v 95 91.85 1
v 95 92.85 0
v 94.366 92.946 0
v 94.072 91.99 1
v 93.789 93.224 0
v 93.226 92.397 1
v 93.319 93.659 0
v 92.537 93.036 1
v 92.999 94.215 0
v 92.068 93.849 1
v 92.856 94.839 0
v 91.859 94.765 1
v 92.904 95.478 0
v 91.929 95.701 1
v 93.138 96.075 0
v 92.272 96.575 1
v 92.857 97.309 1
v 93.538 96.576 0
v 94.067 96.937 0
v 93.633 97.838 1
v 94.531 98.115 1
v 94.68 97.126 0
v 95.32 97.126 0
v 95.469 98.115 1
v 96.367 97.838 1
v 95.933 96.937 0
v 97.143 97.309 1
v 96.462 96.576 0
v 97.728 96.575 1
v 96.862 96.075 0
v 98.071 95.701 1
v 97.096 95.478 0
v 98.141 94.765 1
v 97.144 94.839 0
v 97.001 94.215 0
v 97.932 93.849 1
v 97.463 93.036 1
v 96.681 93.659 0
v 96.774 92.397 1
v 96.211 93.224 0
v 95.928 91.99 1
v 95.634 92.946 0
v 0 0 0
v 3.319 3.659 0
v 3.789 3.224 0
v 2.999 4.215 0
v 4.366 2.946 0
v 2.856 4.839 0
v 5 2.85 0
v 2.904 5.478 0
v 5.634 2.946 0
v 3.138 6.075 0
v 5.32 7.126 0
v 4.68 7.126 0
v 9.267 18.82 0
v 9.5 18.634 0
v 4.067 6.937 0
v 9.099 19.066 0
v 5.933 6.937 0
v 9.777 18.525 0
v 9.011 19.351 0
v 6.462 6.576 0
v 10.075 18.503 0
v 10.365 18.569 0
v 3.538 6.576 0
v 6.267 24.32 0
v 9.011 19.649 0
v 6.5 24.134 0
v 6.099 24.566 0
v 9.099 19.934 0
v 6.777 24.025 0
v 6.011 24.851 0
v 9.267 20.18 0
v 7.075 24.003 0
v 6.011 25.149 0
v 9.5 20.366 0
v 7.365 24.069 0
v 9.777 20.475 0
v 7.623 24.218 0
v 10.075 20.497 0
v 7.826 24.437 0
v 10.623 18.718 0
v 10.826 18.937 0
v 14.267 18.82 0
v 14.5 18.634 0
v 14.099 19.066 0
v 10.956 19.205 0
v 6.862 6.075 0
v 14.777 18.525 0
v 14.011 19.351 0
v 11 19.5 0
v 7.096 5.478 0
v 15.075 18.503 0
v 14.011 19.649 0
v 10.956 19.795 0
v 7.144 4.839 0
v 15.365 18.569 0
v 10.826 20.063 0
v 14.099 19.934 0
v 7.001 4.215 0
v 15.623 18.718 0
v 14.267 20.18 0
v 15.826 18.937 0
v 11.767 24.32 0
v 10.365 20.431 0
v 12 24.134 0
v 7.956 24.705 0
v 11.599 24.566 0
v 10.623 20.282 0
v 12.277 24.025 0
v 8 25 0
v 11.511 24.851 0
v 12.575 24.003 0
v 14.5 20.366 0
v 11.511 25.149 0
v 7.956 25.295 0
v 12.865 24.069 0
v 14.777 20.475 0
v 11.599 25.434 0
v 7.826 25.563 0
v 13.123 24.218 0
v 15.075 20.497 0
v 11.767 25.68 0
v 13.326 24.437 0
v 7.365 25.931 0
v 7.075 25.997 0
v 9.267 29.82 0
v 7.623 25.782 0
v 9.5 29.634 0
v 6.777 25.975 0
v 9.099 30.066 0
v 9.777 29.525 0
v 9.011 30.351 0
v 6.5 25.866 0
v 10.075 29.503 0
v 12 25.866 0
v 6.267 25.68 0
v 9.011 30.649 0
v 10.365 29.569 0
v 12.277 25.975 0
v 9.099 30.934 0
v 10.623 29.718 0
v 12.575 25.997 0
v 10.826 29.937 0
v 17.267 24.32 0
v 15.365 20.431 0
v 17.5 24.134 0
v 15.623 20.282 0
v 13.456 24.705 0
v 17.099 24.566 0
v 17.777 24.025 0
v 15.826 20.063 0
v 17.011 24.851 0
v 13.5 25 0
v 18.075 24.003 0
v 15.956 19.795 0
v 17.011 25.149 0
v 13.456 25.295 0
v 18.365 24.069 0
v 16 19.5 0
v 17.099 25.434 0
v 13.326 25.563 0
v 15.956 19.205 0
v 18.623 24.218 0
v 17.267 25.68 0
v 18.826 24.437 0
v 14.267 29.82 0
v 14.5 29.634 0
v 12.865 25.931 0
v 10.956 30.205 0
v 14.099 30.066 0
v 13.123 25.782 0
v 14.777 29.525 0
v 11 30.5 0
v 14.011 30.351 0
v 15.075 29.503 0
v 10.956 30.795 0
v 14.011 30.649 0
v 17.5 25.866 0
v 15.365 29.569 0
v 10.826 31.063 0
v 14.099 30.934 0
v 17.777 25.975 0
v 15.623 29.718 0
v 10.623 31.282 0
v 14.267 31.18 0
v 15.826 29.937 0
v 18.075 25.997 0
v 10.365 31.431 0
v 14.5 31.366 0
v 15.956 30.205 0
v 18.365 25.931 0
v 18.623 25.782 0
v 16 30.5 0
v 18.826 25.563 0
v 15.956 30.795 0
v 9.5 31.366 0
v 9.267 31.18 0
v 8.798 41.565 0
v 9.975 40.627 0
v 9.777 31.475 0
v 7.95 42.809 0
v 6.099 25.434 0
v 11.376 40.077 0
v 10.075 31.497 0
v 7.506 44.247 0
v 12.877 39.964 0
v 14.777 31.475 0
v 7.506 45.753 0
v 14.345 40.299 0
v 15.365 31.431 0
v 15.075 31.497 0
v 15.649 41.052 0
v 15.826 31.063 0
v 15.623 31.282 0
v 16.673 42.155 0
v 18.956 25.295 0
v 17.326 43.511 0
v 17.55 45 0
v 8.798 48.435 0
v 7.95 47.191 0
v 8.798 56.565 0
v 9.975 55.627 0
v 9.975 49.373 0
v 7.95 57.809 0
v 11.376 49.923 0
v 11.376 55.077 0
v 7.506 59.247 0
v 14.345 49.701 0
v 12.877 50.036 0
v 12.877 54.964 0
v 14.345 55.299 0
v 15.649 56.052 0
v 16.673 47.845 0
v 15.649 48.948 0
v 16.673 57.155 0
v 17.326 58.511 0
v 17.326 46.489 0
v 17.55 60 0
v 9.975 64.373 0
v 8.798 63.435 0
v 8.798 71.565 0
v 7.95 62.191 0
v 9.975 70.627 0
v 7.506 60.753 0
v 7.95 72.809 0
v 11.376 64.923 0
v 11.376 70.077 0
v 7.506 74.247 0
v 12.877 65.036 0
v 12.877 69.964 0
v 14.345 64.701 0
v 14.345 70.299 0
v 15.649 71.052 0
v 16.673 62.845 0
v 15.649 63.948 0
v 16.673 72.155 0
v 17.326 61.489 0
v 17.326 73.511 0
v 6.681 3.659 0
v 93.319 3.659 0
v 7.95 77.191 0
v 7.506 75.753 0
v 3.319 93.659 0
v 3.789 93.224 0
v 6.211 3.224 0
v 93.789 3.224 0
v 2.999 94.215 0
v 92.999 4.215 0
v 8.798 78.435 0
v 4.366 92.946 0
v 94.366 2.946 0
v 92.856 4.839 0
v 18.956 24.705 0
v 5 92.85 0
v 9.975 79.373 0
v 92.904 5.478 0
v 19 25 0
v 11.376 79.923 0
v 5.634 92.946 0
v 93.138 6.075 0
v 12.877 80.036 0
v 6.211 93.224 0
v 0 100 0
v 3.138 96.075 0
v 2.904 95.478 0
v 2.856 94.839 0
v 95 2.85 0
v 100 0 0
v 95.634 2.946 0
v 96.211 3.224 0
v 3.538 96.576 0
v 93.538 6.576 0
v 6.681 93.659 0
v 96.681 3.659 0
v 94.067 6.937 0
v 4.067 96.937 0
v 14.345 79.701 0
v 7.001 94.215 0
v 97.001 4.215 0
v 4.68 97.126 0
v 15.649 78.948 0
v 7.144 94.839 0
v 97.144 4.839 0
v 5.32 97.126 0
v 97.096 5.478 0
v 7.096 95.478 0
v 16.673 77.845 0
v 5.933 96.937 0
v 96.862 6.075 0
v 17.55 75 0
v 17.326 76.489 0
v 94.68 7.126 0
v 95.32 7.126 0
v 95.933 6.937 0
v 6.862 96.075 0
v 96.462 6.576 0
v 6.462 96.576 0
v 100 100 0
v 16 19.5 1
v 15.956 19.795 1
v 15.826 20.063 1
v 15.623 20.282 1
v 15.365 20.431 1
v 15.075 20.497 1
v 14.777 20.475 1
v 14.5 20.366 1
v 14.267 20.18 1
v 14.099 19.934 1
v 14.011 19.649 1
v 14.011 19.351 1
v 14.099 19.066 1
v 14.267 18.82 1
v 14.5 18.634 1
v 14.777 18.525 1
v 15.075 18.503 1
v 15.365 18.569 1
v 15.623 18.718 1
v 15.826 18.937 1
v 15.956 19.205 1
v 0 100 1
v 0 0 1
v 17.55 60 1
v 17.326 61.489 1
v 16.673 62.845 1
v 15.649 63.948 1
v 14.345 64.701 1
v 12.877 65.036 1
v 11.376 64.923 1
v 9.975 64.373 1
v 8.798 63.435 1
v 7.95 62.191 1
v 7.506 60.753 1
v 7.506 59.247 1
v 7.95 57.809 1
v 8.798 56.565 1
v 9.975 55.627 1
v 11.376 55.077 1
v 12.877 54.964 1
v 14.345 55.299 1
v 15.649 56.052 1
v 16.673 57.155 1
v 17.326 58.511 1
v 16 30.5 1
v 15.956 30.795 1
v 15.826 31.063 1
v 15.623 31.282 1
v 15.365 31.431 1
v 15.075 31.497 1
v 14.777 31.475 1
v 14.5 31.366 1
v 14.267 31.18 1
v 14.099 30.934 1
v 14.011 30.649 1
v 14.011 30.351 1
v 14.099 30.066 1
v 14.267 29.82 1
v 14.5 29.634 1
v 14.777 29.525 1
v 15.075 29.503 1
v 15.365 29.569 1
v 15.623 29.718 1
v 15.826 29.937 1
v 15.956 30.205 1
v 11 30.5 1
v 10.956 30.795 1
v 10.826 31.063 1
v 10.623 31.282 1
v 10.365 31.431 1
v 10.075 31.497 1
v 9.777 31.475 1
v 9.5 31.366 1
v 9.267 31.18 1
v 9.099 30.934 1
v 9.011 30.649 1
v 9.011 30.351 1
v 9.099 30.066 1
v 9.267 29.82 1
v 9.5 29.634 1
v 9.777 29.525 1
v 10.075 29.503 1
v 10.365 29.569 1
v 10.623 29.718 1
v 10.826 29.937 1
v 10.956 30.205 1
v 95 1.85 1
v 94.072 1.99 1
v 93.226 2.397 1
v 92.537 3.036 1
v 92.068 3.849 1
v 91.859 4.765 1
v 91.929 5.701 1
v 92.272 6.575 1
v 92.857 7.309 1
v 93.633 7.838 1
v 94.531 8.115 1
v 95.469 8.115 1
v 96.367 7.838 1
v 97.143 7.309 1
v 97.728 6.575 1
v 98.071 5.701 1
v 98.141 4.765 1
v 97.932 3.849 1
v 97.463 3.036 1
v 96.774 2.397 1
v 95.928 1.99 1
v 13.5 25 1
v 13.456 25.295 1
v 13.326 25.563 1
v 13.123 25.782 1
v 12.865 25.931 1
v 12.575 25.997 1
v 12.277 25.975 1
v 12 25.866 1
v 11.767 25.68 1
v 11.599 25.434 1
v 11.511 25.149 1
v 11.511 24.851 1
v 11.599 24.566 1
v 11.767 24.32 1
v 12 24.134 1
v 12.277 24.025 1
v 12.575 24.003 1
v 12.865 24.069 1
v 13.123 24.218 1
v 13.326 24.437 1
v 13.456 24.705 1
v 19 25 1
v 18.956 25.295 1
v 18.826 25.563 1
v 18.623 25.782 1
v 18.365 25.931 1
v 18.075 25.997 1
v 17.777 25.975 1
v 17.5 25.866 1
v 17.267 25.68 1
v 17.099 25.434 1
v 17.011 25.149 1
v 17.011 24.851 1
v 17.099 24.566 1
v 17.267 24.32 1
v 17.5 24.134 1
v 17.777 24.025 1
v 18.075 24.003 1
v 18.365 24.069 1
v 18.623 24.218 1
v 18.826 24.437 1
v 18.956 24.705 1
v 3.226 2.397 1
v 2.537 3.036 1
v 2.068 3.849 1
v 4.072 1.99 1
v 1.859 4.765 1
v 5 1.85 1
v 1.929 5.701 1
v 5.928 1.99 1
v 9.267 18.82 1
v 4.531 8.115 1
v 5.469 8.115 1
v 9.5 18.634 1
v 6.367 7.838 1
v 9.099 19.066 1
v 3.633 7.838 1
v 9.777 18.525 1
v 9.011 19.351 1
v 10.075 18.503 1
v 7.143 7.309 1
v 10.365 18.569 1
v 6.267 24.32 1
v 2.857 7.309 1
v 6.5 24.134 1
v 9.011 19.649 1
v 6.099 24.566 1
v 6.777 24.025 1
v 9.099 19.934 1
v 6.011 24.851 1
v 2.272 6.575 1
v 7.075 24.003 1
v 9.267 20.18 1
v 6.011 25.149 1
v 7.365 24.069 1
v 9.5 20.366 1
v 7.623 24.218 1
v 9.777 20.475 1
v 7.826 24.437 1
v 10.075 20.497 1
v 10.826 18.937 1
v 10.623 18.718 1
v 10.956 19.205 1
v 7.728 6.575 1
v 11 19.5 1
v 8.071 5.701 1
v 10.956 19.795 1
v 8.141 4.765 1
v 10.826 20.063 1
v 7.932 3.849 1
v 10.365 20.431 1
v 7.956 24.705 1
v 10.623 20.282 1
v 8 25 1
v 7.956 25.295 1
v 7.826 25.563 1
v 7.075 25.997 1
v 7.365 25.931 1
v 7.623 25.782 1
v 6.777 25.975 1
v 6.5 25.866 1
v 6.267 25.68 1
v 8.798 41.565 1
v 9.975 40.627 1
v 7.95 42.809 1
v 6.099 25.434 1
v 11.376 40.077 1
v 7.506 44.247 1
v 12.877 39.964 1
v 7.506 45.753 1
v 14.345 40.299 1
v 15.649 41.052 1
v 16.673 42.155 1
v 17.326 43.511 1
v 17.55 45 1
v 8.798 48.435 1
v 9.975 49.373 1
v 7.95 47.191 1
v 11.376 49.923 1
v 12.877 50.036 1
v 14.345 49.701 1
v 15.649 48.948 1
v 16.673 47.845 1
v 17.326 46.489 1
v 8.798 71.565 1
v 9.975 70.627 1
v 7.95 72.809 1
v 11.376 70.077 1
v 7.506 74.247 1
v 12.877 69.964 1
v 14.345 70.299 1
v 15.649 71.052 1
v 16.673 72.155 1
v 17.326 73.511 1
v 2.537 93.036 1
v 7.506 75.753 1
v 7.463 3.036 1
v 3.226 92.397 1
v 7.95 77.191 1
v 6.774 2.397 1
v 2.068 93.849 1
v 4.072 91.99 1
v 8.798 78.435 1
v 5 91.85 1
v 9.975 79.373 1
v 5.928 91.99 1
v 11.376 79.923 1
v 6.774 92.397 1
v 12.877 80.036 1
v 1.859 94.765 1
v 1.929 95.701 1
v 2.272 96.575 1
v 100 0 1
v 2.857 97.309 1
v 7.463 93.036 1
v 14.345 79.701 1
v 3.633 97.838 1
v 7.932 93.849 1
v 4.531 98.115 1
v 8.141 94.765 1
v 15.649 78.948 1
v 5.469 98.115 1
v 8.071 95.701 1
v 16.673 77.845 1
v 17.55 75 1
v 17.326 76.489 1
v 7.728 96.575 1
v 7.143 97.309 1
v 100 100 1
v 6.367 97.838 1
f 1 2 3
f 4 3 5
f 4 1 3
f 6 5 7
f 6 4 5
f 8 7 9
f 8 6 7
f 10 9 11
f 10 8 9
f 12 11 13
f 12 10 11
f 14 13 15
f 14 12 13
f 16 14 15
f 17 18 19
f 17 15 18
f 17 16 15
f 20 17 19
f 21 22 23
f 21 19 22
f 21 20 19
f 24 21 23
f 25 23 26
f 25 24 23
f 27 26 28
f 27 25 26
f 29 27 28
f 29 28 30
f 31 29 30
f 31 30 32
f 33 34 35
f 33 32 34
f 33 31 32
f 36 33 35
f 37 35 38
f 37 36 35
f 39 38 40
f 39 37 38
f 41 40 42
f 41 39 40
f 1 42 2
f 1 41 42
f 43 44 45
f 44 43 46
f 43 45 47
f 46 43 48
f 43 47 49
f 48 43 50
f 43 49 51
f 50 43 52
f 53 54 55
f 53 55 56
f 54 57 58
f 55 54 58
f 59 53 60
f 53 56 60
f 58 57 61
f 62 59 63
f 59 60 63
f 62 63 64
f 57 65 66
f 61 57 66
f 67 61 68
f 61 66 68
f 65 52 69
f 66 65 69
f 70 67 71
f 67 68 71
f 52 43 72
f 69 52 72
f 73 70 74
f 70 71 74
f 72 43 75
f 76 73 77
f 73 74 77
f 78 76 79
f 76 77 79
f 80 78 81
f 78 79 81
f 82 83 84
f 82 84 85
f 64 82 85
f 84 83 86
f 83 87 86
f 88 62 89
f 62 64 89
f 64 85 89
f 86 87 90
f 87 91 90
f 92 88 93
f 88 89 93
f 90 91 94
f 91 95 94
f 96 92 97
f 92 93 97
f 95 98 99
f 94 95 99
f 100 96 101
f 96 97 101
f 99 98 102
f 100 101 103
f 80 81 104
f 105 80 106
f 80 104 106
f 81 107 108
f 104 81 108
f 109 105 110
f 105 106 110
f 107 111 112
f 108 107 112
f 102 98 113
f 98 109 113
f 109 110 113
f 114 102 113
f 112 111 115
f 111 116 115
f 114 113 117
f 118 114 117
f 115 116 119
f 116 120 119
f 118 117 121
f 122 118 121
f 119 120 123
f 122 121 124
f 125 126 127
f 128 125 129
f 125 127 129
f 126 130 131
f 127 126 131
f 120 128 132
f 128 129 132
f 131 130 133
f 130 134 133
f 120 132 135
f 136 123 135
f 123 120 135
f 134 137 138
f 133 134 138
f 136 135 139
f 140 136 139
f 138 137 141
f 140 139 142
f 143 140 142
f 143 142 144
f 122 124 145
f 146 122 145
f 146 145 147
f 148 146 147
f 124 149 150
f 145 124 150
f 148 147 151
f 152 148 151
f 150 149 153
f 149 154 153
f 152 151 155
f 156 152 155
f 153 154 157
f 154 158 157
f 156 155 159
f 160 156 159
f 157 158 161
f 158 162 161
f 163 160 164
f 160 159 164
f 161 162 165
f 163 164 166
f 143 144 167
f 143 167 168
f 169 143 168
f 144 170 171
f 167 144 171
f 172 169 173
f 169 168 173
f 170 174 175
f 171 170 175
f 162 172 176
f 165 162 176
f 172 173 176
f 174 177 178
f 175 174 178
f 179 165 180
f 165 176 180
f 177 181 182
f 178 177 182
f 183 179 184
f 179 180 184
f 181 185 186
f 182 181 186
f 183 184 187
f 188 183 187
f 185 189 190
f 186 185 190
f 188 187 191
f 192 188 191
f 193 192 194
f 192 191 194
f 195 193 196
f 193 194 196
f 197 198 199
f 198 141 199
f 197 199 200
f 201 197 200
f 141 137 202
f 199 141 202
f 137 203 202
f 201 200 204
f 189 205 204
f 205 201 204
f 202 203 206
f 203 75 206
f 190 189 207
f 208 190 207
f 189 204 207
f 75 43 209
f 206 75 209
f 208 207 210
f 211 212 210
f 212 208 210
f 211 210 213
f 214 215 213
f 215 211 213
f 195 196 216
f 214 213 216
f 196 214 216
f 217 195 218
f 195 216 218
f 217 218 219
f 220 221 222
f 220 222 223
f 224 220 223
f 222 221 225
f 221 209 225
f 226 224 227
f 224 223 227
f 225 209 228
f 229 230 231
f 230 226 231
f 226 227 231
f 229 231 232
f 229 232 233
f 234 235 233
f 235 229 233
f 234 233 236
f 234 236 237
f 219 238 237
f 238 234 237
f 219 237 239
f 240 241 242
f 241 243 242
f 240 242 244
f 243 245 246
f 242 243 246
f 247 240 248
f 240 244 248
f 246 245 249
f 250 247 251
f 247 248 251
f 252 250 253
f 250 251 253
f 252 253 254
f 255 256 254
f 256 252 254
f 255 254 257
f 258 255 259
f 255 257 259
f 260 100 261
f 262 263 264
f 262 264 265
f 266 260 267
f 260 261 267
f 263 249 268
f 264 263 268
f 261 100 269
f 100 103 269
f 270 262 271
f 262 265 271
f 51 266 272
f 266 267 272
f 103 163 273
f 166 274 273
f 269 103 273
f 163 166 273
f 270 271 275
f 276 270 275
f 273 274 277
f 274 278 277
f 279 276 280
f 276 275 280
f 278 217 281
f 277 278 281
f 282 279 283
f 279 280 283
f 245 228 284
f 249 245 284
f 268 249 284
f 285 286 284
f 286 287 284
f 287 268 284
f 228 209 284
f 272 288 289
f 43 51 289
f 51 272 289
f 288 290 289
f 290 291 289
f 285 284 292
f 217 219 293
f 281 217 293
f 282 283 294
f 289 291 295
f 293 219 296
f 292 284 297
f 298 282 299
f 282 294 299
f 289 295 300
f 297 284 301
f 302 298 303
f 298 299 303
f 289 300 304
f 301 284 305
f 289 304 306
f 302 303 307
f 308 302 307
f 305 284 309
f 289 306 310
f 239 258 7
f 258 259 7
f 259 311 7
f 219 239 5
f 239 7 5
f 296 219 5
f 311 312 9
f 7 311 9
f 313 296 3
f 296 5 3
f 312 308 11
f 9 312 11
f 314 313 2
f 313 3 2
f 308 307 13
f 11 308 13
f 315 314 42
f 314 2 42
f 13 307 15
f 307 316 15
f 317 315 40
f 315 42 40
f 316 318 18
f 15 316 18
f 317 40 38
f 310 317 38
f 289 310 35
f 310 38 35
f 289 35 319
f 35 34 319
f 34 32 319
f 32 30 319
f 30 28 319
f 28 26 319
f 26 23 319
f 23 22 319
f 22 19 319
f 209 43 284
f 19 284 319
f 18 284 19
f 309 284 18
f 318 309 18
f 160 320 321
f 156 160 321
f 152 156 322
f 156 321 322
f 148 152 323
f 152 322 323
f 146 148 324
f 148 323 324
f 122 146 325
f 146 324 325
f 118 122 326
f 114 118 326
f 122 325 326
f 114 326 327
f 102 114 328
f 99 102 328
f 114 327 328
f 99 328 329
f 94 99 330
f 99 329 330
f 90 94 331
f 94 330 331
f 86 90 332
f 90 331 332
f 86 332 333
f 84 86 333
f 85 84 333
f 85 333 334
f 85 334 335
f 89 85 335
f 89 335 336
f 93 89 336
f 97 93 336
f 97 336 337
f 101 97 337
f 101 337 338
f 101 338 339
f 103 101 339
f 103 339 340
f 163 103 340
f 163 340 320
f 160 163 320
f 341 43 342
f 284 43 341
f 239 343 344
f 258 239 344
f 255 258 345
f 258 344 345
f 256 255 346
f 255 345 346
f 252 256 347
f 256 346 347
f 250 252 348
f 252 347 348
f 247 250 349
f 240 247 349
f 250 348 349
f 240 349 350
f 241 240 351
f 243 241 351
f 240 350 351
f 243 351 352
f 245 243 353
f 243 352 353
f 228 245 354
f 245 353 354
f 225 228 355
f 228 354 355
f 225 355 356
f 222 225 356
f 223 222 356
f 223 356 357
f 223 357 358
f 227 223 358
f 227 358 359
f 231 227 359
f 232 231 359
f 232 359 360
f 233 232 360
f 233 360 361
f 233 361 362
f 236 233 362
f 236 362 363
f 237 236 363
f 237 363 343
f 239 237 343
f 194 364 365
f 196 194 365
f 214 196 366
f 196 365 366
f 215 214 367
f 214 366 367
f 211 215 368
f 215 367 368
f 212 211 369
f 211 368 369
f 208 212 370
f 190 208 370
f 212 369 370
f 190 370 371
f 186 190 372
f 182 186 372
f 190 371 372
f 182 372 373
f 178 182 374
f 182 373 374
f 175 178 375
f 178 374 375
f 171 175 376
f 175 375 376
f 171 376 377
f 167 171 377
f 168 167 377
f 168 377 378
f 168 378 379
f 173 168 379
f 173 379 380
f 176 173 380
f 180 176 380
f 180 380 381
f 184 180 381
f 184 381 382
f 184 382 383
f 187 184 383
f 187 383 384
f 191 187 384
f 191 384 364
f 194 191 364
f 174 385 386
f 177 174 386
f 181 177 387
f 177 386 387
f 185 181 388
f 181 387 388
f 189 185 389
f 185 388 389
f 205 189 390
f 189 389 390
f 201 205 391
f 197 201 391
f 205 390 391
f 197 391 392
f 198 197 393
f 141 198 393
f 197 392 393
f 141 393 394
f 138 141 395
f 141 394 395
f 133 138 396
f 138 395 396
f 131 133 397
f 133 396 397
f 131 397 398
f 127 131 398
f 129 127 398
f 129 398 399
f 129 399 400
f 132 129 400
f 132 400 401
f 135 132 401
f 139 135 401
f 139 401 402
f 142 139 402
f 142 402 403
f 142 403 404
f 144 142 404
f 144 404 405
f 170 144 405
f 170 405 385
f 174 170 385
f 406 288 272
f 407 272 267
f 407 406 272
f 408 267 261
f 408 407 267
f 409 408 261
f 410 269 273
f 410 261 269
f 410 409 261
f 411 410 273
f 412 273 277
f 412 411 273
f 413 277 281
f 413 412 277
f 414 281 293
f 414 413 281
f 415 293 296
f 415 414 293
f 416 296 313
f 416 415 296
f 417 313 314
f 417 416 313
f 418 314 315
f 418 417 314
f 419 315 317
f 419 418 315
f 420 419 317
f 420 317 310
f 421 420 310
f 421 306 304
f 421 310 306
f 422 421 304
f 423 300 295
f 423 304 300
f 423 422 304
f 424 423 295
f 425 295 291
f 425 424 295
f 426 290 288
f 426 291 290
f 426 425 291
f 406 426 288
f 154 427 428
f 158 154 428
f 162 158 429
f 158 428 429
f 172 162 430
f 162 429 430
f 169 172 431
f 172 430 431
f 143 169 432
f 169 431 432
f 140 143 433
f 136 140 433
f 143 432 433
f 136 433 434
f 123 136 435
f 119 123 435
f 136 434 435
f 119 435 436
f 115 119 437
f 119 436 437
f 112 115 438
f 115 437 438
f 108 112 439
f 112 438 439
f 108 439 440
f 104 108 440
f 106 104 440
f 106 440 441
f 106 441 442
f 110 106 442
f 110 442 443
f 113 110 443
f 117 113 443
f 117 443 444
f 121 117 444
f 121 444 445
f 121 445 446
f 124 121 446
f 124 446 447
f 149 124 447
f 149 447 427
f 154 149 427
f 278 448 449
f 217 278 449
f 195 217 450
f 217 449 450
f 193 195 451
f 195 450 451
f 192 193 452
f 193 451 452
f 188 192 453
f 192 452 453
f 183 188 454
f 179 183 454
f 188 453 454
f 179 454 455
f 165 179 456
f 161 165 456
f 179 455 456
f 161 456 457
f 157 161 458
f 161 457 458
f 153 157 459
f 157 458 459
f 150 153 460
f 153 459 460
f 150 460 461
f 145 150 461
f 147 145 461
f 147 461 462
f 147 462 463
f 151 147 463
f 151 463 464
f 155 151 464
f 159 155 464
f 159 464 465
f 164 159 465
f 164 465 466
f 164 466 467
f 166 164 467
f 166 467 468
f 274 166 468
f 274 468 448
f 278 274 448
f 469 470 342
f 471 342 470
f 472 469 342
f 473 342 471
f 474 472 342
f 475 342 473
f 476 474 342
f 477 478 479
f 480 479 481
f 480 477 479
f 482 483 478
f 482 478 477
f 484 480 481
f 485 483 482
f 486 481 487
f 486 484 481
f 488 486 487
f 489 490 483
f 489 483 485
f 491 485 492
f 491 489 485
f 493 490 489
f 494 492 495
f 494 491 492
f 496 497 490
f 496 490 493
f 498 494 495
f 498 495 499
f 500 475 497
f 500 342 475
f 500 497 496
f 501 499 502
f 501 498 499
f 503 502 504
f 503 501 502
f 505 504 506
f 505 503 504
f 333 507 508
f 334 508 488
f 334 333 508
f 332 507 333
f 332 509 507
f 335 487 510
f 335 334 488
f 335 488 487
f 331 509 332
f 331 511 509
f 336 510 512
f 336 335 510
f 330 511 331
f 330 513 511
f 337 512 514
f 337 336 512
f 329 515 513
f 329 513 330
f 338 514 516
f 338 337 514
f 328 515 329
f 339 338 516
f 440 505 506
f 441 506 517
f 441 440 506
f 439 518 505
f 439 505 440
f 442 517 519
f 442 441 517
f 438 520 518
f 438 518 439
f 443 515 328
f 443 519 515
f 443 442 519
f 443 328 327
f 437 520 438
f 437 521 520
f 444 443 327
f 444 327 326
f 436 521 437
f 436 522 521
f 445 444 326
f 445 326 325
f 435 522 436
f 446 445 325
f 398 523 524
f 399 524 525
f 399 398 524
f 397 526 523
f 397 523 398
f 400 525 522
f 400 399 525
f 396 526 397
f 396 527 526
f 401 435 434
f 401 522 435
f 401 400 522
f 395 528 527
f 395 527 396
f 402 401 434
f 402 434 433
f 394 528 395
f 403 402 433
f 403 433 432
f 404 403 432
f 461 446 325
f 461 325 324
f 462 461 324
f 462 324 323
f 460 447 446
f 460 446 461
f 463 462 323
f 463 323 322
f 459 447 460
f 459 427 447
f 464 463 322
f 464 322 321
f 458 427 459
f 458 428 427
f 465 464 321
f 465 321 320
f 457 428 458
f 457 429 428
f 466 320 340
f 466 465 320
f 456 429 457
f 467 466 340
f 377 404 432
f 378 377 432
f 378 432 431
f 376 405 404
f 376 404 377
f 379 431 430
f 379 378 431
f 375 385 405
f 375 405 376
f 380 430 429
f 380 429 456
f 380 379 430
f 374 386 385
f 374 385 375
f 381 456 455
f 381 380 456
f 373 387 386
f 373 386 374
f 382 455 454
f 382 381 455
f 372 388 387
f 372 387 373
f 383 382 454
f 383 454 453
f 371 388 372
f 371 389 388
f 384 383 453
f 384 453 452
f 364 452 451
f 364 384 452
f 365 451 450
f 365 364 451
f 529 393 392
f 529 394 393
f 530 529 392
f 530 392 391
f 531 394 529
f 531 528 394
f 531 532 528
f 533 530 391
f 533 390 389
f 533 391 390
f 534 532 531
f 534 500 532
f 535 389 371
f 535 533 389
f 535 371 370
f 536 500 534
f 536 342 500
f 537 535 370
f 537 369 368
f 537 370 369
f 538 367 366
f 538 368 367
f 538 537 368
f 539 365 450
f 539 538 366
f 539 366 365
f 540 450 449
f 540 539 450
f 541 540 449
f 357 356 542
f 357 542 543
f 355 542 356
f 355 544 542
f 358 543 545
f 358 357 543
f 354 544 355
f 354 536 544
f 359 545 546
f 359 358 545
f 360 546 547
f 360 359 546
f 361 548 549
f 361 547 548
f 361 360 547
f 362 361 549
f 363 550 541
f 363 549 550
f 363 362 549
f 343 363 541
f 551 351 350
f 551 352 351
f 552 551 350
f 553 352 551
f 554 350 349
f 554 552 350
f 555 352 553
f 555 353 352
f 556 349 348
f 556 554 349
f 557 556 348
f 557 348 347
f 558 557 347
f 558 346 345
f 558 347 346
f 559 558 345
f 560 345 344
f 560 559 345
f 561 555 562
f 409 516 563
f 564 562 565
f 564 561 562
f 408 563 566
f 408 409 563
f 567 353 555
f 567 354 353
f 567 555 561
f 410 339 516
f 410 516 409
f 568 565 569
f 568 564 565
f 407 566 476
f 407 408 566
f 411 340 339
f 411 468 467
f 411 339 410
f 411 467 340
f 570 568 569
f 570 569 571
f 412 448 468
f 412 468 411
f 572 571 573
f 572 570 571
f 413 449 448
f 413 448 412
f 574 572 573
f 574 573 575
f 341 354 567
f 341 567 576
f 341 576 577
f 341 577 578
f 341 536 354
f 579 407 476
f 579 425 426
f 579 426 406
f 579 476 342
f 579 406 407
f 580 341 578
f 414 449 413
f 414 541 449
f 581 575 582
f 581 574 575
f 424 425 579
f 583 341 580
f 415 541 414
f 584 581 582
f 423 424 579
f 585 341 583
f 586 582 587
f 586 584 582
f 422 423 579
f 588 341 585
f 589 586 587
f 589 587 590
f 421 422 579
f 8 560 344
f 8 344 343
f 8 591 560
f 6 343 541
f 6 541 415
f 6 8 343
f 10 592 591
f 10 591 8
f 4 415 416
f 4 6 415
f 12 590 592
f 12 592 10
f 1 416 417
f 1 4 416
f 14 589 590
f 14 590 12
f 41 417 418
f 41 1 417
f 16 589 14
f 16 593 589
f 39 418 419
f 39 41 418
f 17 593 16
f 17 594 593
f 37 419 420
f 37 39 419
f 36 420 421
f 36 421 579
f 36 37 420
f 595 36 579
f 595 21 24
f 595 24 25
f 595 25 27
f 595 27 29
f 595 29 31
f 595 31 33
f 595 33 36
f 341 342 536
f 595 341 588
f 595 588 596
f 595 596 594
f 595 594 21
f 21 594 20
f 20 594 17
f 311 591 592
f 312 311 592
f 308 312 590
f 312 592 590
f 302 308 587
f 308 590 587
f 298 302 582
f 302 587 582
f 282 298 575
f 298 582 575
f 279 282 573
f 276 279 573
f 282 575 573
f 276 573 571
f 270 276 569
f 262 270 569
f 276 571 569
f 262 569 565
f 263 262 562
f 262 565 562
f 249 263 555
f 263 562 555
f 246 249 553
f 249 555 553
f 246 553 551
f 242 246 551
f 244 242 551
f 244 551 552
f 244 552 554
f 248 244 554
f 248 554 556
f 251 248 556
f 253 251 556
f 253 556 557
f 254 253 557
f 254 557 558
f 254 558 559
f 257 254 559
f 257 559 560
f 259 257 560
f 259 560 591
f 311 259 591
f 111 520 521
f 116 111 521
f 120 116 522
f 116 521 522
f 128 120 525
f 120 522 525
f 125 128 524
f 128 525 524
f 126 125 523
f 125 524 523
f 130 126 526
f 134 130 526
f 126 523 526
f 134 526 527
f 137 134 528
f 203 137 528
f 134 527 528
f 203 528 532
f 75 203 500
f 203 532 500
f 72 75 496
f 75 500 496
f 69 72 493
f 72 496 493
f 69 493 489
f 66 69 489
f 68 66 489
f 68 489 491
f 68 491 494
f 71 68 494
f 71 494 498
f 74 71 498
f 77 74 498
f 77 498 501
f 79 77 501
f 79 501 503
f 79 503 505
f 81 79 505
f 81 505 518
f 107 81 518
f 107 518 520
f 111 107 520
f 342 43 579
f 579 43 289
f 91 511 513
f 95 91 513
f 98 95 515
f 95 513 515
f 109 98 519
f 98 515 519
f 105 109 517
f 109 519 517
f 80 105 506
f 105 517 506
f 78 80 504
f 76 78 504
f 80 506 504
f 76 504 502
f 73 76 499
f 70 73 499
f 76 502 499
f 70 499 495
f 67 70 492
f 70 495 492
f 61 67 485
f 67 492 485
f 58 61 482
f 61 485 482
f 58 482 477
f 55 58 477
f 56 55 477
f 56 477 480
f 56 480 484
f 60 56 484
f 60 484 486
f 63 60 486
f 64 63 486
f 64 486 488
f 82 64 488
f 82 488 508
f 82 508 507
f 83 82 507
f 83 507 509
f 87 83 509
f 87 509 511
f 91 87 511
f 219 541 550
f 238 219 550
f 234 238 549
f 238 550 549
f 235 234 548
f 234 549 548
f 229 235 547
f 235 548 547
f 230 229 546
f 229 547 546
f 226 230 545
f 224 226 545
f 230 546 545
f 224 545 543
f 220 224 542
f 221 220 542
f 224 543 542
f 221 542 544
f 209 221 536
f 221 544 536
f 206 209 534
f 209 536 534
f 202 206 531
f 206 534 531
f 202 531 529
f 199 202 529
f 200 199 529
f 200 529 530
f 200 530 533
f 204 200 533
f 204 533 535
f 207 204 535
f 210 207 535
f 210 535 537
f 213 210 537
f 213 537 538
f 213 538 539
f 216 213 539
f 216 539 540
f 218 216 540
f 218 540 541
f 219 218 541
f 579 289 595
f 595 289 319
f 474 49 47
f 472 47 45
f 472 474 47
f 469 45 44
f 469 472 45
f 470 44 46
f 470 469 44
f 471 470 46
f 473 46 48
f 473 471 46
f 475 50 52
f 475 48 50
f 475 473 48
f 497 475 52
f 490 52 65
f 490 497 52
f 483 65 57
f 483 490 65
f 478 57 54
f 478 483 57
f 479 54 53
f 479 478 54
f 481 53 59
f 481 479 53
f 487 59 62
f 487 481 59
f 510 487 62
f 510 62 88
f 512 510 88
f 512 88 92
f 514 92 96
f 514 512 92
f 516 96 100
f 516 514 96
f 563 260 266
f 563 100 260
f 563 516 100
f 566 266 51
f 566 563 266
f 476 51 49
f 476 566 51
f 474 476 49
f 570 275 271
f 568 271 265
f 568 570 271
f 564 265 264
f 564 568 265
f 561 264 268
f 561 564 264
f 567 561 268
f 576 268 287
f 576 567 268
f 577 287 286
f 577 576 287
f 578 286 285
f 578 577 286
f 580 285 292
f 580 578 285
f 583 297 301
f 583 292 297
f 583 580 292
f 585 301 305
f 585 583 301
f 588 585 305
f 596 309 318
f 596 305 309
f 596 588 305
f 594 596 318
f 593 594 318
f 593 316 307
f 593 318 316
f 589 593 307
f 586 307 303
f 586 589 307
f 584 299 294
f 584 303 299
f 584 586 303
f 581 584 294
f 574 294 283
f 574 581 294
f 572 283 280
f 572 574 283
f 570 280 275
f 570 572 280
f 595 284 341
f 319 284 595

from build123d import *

# Parameters (mm, degrees)
ESQUISSE1_W                                 = 100
ESQUISSE1_H                                 = 100
BOSS_EXTRU_1_DEPTH                          = 1
FRAISAGE_POUR_VIS_T_TE_FRAIS_E_M31_AT_COUNT = 2
FRAISAGE_POUR_VIS_T_TE_FRAIS_E_M31_AT_PITCH = 90
FRAISAGE_POUR_VIS_T_TE_FRAIS_E_M31_2_COUNT  = 2
FRAISAGE_POUR_VIS_T_TE_FRAIS_E_M31_2_PITCH  = 127.279220614
FRAISAGE_POUR_VIS_T_TE_FRAIS_E_M31_3_COUNT  = 2
FRAISAGE_POUR_VIS_T_TE_FRAIS_E_M31_3_PITCH  = 90
ESQUISSE4_R                                 = 5.05
ESQUISSE4_R_2                               = 1
ENL_V_MAT_EXTRU_1_DEPTH                     = 2


with BuildPart() as part:
    # Esquisse1 → Boss.-Extru.1 (new body)
    with BuildSketch(Plane.XY):
        with Locations((50, 50)):
            Rectangle(ESQUISSE1_W, ESQUISSE1_H)
    extrude(amount=BOSS_EXTRU_1_DEPTH)

    # Esquisse3 → Fraisage pour vis à tête fraisée M31 (revolve, cut)
    with BuildSketch(Plane(origin=(5, 95, 1), x_dir=(0, -1, 0), z_dir=(1, 0, 0))):
        Polygon((0, 0), (0, 1), (1.8, 1), (1.8, 1.35), (3.15, 0), align=None)
    fraisage_pour_vis_t_te_frais_e_m31 = revolve(axis=Axis((5, 95, 7.35), (0, 0, -1)), mode=Mode.SUBTRACT)

    # Fraisage pour vis à tête fraisée M31 at: Fraisage pour vis à tête fraisée M31 ×2
    with Locations(*[(i * FRAISAGE_POUR_VIS_T_TE_FRAIS_E_M31_AT_PITCH, 0, 0) for i in range(1, FRAISAGE_POUR_VIS_T_TE_FRAIS_E_M31_AT_COUNT)]):
        add(fraisage_pour_vis_t_te_frais_e_m31, mode=Mode.SUBTRACT)

    # Fraisage pour vis _ t_te frais_e M31 2: Fraisage pour vis à tête fraisée M31 ×2
    with Locations(*[Vector(0.707106781, -0.707106781, 0) * (i * FRAISAGE_POUR_VIS_T_TE_FRAIS_E_M31_2_PITCH) for i in range(1, FRAISAGE_POUR_VIS_T_TE_FRAIS_E_M31_2_COUNT)]):
        add(fraisage_pour_vis_t_te_frais_e_m31, mode=Mode.SUBTRACT)

    # Fraisage pour vis _ t_te frais_e M31 3: Fraisage pour vis à tête fraisée M31 ×2
    with Locations(*[(0, -i * FRAISAGE_POUR_VIS_T_TE_FRAIS_E_M31_3_PITCH, 0) for i in range(1, FRAISAGE_POUR_VIS_T_TE_FRAIS_E_M31_3_COUNT)]):
        add(fraisage_pour_vis_t_te_frais_e_m31, mode=Mode.SUBTRACT)

    # Esquisse4 → Enlèv. mat.-Extru.1 (cut, through all)
    with BuildSketch(Plane.XY.offset(1)):
        with Locations((12.5, 75)):
            Circle(ESQUISSE4_R)
        with Locations((12.5, 25)):
            Circle(ESQUISSE4_R_2)
        with Locations((10, 19.5)):
            Circle(ESQUISSE4_R_2)
        with Locations((7, 25)):
            Circle(ESQUISSE4_R_2)
        with Locations((18, 25)):
            Circle(ESQUISSE4_R_2)
        with Locations((10, 30.5)):
            Circle(ESQUISSE4_R_2)
        with Locations((15, 30.5)):
            Circle(ESQUISSE4_R_2)
        with Locations((15, 19.5)):
            Circle(ESQUISSE4_R_2)
        with Locations((12.5, 60)):
            Circle(ESQUISSE4_R)
        with Locations((12.5, 45)):
            Circle(ESQUISSE4_R)
    extrude(amount=-ENL_V_MAT_EXTRU_1_DEPTH, mode=Mode.SUBTRACT)


solid = part.part
